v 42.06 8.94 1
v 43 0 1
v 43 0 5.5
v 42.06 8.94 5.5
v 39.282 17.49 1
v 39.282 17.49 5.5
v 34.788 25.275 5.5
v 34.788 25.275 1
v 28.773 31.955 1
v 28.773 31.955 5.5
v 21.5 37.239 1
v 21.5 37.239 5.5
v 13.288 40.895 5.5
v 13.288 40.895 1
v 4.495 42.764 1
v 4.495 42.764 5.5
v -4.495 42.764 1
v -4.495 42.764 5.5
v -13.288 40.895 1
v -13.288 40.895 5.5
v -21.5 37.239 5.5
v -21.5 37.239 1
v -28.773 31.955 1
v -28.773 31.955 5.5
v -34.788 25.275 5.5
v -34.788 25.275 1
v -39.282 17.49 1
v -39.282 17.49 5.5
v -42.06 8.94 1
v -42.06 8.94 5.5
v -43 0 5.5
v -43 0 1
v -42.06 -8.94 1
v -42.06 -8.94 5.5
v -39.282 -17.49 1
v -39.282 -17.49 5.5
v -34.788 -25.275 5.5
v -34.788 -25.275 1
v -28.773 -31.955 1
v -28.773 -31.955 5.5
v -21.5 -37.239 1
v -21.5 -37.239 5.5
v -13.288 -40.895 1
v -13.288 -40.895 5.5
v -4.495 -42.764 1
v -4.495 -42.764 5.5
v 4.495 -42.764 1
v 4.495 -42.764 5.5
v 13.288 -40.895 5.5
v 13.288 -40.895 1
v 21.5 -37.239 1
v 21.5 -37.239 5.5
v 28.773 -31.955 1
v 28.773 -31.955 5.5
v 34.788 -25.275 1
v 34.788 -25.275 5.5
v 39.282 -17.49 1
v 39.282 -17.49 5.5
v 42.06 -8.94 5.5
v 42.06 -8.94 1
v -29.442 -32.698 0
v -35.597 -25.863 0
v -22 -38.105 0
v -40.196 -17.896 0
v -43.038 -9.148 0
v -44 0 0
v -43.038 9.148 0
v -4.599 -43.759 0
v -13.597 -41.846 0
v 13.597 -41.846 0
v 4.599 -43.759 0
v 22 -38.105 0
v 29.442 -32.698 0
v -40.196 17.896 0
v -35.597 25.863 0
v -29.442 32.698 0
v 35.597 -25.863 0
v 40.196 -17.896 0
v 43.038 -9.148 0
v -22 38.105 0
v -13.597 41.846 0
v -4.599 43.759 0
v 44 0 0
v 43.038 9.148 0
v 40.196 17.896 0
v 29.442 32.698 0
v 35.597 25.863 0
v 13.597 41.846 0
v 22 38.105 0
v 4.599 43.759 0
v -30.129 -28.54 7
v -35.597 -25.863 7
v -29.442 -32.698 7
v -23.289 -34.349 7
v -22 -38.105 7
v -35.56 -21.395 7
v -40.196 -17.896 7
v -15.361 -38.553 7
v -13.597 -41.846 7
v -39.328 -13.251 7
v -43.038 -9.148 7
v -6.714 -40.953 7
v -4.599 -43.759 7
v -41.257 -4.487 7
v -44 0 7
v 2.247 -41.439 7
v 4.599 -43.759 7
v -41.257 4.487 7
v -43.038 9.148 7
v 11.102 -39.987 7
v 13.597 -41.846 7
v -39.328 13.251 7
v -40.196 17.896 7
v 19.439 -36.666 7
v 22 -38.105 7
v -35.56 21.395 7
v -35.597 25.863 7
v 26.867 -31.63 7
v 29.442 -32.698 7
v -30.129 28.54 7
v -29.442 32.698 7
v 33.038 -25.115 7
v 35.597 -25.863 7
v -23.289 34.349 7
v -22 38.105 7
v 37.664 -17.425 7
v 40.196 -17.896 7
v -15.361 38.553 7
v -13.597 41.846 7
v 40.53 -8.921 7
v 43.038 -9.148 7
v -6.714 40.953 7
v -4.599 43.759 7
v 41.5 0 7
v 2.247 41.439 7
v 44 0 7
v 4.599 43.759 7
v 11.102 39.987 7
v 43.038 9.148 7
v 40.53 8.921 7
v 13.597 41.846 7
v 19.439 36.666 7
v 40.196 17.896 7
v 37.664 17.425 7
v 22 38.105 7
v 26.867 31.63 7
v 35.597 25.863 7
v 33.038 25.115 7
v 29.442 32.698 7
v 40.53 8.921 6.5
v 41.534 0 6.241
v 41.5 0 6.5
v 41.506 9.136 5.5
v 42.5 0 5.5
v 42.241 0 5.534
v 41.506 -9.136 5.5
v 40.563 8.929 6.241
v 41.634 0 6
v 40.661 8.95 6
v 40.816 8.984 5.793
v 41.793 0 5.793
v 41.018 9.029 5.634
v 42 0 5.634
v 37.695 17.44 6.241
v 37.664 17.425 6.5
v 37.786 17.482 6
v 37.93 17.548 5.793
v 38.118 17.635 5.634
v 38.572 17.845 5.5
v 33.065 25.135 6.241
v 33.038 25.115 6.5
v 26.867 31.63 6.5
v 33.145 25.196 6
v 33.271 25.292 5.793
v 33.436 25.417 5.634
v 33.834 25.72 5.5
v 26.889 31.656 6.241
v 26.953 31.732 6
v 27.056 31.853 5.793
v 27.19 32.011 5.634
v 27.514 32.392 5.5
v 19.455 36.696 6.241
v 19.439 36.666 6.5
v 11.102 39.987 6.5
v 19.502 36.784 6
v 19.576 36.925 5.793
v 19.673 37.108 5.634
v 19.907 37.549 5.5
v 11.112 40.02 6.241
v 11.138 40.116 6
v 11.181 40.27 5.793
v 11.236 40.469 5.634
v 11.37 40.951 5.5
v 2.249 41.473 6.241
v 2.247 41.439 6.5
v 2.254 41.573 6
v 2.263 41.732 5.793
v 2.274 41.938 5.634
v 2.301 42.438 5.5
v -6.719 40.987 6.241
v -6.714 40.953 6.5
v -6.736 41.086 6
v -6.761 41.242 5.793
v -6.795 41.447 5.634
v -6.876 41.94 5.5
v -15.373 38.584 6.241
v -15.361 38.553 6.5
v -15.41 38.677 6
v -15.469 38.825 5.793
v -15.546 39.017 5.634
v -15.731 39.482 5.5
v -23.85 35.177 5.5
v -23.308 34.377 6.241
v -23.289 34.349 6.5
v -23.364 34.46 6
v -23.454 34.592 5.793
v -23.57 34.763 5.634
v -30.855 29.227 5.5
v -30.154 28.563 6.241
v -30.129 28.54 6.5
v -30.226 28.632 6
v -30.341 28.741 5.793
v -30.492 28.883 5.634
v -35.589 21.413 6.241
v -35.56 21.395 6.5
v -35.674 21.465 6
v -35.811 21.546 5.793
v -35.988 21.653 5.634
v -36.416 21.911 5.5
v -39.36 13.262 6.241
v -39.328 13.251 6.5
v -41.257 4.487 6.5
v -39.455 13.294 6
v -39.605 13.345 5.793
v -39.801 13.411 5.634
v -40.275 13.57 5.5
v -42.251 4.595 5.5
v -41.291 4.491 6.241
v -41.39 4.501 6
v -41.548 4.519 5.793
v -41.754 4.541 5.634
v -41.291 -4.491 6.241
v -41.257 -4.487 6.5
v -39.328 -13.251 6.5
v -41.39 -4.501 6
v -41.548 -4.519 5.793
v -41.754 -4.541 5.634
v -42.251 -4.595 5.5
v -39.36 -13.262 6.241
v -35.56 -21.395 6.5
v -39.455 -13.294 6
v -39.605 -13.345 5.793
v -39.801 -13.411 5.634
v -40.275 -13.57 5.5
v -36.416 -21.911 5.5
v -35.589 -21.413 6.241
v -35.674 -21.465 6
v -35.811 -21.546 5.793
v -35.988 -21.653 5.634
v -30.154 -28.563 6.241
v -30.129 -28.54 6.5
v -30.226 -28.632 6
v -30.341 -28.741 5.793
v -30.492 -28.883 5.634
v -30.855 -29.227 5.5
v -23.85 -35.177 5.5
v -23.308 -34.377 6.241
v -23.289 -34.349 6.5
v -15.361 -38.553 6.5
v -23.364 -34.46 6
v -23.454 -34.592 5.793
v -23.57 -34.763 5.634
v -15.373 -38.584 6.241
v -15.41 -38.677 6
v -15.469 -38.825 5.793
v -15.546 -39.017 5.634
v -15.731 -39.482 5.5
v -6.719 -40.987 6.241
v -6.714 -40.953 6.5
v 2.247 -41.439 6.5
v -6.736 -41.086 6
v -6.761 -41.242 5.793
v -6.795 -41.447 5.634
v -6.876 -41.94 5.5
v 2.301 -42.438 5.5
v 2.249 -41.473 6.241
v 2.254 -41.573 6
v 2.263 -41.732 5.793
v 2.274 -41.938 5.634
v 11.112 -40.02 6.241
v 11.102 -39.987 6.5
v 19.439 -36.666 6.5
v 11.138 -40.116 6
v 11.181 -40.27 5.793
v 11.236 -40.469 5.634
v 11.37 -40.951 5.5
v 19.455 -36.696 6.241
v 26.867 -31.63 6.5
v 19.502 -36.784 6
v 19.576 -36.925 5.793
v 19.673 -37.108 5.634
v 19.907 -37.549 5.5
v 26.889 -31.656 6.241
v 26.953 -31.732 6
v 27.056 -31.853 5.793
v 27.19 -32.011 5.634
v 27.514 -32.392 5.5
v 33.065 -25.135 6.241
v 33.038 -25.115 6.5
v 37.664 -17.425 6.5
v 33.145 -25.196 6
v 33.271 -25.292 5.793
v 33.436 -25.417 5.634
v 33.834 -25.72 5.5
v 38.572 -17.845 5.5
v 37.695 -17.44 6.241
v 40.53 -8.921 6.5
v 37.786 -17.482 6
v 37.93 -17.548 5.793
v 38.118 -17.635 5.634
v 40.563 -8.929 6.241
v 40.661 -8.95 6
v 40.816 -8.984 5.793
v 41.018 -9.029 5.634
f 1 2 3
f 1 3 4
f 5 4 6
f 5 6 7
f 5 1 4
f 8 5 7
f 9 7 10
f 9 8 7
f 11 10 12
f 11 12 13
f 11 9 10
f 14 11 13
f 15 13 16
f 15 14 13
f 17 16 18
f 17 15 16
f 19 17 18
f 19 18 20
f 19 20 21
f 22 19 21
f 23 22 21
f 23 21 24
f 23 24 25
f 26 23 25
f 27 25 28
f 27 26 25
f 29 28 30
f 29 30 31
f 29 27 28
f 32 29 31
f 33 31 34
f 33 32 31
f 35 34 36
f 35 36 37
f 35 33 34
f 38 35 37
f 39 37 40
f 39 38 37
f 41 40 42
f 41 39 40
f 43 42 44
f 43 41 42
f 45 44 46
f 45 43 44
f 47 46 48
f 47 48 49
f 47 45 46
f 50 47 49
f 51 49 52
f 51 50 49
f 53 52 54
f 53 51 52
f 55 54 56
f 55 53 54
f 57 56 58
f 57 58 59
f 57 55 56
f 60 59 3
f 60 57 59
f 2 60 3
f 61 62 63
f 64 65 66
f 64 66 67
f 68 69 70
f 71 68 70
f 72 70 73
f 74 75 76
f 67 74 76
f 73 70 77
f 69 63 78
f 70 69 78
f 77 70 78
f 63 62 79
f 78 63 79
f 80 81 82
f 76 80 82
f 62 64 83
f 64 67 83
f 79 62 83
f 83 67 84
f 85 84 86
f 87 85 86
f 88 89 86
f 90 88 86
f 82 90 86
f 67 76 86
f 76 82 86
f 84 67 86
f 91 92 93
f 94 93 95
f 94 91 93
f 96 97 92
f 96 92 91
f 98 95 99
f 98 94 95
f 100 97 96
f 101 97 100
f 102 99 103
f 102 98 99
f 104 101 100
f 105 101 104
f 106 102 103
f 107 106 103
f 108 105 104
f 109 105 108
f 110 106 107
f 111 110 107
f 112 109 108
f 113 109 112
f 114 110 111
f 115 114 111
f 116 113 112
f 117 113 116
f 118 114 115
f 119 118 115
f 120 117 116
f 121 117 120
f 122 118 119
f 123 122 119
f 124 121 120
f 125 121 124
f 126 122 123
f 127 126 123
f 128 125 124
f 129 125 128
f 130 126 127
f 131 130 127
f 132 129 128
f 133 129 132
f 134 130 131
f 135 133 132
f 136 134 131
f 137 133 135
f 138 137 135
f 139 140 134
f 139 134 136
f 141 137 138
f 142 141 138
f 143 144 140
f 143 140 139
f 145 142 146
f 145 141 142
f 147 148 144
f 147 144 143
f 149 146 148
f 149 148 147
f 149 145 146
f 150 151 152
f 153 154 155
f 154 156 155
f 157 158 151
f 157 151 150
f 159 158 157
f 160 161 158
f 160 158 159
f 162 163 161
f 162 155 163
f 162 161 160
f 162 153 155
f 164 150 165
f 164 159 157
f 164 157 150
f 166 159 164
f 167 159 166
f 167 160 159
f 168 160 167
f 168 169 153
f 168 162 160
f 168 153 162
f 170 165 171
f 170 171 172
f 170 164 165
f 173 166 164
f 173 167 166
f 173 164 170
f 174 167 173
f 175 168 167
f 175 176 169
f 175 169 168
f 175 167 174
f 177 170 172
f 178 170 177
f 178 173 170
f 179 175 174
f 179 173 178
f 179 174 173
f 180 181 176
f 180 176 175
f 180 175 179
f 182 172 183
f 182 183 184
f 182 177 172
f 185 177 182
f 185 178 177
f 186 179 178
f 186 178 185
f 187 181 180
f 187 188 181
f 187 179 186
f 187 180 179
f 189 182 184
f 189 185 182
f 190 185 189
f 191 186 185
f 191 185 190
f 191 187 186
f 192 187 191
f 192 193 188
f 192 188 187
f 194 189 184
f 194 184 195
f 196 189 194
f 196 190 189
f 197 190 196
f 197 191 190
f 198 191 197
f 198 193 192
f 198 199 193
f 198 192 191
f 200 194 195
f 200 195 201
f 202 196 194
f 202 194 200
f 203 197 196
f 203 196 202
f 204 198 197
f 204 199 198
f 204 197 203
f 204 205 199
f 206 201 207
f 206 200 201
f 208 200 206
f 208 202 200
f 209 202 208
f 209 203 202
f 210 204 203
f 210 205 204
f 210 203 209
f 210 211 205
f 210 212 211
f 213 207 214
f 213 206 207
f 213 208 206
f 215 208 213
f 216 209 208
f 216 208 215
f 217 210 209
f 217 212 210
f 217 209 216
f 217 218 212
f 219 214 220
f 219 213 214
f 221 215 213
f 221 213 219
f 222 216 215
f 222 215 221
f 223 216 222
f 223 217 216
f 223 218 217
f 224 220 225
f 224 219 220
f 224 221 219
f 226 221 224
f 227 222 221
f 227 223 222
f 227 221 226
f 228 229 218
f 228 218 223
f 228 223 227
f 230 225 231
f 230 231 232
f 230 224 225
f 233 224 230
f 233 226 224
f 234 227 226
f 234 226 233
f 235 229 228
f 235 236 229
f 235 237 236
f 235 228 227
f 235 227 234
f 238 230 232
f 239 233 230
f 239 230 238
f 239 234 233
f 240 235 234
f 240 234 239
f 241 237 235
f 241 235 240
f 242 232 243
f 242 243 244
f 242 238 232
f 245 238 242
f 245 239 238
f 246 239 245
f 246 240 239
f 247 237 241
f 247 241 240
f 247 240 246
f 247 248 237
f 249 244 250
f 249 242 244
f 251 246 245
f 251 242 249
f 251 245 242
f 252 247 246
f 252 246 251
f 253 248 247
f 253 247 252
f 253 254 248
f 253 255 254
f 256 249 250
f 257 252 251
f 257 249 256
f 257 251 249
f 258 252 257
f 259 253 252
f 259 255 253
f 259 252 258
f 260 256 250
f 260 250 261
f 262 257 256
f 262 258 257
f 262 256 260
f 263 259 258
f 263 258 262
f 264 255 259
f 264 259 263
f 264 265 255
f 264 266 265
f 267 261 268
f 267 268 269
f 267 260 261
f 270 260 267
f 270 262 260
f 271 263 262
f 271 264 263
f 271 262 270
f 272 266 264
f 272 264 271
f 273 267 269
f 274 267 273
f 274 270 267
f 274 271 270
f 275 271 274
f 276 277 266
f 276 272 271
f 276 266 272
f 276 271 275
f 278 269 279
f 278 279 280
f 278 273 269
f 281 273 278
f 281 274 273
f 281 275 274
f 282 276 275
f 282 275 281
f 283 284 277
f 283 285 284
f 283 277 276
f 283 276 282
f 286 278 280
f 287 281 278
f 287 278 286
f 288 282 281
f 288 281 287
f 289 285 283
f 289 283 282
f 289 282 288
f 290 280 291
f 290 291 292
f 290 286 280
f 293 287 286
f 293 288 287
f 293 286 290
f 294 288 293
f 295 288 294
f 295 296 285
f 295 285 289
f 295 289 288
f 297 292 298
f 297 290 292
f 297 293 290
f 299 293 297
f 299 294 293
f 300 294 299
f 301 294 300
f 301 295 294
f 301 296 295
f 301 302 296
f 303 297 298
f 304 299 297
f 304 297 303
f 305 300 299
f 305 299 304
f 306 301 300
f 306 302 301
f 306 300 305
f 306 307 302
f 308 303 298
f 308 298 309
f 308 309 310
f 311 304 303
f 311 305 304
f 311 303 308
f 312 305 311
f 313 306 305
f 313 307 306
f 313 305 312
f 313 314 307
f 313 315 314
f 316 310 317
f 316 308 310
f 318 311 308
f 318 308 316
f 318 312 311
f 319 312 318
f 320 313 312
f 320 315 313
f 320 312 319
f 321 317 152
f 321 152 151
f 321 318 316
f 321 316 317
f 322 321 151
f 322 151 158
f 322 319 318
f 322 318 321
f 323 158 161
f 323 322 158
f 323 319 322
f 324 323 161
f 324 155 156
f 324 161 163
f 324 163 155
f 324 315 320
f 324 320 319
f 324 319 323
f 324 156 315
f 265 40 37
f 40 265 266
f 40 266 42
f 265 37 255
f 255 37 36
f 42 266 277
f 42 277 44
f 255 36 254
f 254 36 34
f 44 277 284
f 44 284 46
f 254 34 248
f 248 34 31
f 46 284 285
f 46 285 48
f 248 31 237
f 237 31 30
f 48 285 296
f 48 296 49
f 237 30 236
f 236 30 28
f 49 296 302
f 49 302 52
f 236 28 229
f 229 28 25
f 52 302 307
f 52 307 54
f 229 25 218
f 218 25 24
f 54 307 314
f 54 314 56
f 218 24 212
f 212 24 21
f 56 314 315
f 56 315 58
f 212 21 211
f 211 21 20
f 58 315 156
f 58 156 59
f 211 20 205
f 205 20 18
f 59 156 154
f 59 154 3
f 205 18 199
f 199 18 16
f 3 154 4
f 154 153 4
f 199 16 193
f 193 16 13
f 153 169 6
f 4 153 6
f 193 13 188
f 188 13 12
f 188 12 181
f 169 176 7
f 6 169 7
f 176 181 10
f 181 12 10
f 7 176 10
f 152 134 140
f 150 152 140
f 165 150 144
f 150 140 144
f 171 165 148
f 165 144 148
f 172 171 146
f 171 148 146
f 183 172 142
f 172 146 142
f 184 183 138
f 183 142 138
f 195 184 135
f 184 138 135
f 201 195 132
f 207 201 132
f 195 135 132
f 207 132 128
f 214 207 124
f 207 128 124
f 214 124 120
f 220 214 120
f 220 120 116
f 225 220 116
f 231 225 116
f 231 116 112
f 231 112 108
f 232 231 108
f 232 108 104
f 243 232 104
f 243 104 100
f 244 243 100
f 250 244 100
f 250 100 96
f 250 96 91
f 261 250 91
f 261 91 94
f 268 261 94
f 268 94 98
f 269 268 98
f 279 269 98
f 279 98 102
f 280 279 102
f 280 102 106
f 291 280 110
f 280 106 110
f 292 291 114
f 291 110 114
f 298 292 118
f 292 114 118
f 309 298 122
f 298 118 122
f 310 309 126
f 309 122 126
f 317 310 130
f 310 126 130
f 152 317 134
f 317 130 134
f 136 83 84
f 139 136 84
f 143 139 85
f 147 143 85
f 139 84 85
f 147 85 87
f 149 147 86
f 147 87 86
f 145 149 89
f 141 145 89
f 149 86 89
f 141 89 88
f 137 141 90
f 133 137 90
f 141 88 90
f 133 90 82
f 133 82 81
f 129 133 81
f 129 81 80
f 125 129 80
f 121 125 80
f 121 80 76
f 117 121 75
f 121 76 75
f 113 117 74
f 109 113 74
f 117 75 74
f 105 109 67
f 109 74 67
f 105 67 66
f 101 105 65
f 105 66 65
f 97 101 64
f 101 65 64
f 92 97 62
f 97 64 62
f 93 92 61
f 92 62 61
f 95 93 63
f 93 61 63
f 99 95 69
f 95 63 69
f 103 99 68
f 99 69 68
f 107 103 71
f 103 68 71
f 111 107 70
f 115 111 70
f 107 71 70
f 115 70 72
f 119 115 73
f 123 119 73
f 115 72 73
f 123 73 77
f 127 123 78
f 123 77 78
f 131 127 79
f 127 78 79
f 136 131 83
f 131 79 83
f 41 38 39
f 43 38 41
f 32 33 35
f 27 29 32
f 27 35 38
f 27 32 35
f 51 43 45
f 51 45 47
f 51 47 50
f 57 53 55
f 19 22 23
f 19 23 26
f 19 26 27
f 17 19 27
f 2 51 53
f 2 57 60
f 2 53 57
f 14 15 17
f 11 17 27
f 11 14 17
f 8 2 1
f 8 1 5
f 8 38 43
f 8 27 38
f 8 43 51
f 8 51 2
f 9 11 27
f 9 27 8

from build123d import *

# Parameters (mm, degrees)
SKETCH006_R     = 44
PAD002_DEPTH    = 7
SKETCH007_R     = 41.5
POCKET004_DEPTH = 6
SKETCH008_R     = 43
POCKET005_DEPTH = 4.5
FILLET002_R     = 1


with BuildPart() as part:
    # Sketch006 → Pad002 (new body)
    with BuildSketch(Plane.XY):
        Circle(SKETCH006_R)
    extrude(amount=PAD002_DEPTH)

    # Sketch007 (on Face3 of Pad002) → Pocket004 (cut)
    with BuildSketch(Plane.XY.offset(7)):
        Circle(SKETCH007_R)
    extrude(amount=-POCKET004_DEPTH, mode=Mode.SUBTRACT)

    # Sketch008 → Pocket005 (cut)
    with BuildSketch(Plane.XY.offset(1)):
        Circle(SKETCH008_R)
    extrude(amount=POCKET005_DEPTH, mode=Mode.SUBTRACT)

    # Fillet002
    fillet002_edges = [part.edges().sort_by_distance(p)[0] for p in [
        (-41.5, 0, 5.5),
    ]]
    fillet(fillet002_edges, radius=FILLET002_R)


solid = part.part
